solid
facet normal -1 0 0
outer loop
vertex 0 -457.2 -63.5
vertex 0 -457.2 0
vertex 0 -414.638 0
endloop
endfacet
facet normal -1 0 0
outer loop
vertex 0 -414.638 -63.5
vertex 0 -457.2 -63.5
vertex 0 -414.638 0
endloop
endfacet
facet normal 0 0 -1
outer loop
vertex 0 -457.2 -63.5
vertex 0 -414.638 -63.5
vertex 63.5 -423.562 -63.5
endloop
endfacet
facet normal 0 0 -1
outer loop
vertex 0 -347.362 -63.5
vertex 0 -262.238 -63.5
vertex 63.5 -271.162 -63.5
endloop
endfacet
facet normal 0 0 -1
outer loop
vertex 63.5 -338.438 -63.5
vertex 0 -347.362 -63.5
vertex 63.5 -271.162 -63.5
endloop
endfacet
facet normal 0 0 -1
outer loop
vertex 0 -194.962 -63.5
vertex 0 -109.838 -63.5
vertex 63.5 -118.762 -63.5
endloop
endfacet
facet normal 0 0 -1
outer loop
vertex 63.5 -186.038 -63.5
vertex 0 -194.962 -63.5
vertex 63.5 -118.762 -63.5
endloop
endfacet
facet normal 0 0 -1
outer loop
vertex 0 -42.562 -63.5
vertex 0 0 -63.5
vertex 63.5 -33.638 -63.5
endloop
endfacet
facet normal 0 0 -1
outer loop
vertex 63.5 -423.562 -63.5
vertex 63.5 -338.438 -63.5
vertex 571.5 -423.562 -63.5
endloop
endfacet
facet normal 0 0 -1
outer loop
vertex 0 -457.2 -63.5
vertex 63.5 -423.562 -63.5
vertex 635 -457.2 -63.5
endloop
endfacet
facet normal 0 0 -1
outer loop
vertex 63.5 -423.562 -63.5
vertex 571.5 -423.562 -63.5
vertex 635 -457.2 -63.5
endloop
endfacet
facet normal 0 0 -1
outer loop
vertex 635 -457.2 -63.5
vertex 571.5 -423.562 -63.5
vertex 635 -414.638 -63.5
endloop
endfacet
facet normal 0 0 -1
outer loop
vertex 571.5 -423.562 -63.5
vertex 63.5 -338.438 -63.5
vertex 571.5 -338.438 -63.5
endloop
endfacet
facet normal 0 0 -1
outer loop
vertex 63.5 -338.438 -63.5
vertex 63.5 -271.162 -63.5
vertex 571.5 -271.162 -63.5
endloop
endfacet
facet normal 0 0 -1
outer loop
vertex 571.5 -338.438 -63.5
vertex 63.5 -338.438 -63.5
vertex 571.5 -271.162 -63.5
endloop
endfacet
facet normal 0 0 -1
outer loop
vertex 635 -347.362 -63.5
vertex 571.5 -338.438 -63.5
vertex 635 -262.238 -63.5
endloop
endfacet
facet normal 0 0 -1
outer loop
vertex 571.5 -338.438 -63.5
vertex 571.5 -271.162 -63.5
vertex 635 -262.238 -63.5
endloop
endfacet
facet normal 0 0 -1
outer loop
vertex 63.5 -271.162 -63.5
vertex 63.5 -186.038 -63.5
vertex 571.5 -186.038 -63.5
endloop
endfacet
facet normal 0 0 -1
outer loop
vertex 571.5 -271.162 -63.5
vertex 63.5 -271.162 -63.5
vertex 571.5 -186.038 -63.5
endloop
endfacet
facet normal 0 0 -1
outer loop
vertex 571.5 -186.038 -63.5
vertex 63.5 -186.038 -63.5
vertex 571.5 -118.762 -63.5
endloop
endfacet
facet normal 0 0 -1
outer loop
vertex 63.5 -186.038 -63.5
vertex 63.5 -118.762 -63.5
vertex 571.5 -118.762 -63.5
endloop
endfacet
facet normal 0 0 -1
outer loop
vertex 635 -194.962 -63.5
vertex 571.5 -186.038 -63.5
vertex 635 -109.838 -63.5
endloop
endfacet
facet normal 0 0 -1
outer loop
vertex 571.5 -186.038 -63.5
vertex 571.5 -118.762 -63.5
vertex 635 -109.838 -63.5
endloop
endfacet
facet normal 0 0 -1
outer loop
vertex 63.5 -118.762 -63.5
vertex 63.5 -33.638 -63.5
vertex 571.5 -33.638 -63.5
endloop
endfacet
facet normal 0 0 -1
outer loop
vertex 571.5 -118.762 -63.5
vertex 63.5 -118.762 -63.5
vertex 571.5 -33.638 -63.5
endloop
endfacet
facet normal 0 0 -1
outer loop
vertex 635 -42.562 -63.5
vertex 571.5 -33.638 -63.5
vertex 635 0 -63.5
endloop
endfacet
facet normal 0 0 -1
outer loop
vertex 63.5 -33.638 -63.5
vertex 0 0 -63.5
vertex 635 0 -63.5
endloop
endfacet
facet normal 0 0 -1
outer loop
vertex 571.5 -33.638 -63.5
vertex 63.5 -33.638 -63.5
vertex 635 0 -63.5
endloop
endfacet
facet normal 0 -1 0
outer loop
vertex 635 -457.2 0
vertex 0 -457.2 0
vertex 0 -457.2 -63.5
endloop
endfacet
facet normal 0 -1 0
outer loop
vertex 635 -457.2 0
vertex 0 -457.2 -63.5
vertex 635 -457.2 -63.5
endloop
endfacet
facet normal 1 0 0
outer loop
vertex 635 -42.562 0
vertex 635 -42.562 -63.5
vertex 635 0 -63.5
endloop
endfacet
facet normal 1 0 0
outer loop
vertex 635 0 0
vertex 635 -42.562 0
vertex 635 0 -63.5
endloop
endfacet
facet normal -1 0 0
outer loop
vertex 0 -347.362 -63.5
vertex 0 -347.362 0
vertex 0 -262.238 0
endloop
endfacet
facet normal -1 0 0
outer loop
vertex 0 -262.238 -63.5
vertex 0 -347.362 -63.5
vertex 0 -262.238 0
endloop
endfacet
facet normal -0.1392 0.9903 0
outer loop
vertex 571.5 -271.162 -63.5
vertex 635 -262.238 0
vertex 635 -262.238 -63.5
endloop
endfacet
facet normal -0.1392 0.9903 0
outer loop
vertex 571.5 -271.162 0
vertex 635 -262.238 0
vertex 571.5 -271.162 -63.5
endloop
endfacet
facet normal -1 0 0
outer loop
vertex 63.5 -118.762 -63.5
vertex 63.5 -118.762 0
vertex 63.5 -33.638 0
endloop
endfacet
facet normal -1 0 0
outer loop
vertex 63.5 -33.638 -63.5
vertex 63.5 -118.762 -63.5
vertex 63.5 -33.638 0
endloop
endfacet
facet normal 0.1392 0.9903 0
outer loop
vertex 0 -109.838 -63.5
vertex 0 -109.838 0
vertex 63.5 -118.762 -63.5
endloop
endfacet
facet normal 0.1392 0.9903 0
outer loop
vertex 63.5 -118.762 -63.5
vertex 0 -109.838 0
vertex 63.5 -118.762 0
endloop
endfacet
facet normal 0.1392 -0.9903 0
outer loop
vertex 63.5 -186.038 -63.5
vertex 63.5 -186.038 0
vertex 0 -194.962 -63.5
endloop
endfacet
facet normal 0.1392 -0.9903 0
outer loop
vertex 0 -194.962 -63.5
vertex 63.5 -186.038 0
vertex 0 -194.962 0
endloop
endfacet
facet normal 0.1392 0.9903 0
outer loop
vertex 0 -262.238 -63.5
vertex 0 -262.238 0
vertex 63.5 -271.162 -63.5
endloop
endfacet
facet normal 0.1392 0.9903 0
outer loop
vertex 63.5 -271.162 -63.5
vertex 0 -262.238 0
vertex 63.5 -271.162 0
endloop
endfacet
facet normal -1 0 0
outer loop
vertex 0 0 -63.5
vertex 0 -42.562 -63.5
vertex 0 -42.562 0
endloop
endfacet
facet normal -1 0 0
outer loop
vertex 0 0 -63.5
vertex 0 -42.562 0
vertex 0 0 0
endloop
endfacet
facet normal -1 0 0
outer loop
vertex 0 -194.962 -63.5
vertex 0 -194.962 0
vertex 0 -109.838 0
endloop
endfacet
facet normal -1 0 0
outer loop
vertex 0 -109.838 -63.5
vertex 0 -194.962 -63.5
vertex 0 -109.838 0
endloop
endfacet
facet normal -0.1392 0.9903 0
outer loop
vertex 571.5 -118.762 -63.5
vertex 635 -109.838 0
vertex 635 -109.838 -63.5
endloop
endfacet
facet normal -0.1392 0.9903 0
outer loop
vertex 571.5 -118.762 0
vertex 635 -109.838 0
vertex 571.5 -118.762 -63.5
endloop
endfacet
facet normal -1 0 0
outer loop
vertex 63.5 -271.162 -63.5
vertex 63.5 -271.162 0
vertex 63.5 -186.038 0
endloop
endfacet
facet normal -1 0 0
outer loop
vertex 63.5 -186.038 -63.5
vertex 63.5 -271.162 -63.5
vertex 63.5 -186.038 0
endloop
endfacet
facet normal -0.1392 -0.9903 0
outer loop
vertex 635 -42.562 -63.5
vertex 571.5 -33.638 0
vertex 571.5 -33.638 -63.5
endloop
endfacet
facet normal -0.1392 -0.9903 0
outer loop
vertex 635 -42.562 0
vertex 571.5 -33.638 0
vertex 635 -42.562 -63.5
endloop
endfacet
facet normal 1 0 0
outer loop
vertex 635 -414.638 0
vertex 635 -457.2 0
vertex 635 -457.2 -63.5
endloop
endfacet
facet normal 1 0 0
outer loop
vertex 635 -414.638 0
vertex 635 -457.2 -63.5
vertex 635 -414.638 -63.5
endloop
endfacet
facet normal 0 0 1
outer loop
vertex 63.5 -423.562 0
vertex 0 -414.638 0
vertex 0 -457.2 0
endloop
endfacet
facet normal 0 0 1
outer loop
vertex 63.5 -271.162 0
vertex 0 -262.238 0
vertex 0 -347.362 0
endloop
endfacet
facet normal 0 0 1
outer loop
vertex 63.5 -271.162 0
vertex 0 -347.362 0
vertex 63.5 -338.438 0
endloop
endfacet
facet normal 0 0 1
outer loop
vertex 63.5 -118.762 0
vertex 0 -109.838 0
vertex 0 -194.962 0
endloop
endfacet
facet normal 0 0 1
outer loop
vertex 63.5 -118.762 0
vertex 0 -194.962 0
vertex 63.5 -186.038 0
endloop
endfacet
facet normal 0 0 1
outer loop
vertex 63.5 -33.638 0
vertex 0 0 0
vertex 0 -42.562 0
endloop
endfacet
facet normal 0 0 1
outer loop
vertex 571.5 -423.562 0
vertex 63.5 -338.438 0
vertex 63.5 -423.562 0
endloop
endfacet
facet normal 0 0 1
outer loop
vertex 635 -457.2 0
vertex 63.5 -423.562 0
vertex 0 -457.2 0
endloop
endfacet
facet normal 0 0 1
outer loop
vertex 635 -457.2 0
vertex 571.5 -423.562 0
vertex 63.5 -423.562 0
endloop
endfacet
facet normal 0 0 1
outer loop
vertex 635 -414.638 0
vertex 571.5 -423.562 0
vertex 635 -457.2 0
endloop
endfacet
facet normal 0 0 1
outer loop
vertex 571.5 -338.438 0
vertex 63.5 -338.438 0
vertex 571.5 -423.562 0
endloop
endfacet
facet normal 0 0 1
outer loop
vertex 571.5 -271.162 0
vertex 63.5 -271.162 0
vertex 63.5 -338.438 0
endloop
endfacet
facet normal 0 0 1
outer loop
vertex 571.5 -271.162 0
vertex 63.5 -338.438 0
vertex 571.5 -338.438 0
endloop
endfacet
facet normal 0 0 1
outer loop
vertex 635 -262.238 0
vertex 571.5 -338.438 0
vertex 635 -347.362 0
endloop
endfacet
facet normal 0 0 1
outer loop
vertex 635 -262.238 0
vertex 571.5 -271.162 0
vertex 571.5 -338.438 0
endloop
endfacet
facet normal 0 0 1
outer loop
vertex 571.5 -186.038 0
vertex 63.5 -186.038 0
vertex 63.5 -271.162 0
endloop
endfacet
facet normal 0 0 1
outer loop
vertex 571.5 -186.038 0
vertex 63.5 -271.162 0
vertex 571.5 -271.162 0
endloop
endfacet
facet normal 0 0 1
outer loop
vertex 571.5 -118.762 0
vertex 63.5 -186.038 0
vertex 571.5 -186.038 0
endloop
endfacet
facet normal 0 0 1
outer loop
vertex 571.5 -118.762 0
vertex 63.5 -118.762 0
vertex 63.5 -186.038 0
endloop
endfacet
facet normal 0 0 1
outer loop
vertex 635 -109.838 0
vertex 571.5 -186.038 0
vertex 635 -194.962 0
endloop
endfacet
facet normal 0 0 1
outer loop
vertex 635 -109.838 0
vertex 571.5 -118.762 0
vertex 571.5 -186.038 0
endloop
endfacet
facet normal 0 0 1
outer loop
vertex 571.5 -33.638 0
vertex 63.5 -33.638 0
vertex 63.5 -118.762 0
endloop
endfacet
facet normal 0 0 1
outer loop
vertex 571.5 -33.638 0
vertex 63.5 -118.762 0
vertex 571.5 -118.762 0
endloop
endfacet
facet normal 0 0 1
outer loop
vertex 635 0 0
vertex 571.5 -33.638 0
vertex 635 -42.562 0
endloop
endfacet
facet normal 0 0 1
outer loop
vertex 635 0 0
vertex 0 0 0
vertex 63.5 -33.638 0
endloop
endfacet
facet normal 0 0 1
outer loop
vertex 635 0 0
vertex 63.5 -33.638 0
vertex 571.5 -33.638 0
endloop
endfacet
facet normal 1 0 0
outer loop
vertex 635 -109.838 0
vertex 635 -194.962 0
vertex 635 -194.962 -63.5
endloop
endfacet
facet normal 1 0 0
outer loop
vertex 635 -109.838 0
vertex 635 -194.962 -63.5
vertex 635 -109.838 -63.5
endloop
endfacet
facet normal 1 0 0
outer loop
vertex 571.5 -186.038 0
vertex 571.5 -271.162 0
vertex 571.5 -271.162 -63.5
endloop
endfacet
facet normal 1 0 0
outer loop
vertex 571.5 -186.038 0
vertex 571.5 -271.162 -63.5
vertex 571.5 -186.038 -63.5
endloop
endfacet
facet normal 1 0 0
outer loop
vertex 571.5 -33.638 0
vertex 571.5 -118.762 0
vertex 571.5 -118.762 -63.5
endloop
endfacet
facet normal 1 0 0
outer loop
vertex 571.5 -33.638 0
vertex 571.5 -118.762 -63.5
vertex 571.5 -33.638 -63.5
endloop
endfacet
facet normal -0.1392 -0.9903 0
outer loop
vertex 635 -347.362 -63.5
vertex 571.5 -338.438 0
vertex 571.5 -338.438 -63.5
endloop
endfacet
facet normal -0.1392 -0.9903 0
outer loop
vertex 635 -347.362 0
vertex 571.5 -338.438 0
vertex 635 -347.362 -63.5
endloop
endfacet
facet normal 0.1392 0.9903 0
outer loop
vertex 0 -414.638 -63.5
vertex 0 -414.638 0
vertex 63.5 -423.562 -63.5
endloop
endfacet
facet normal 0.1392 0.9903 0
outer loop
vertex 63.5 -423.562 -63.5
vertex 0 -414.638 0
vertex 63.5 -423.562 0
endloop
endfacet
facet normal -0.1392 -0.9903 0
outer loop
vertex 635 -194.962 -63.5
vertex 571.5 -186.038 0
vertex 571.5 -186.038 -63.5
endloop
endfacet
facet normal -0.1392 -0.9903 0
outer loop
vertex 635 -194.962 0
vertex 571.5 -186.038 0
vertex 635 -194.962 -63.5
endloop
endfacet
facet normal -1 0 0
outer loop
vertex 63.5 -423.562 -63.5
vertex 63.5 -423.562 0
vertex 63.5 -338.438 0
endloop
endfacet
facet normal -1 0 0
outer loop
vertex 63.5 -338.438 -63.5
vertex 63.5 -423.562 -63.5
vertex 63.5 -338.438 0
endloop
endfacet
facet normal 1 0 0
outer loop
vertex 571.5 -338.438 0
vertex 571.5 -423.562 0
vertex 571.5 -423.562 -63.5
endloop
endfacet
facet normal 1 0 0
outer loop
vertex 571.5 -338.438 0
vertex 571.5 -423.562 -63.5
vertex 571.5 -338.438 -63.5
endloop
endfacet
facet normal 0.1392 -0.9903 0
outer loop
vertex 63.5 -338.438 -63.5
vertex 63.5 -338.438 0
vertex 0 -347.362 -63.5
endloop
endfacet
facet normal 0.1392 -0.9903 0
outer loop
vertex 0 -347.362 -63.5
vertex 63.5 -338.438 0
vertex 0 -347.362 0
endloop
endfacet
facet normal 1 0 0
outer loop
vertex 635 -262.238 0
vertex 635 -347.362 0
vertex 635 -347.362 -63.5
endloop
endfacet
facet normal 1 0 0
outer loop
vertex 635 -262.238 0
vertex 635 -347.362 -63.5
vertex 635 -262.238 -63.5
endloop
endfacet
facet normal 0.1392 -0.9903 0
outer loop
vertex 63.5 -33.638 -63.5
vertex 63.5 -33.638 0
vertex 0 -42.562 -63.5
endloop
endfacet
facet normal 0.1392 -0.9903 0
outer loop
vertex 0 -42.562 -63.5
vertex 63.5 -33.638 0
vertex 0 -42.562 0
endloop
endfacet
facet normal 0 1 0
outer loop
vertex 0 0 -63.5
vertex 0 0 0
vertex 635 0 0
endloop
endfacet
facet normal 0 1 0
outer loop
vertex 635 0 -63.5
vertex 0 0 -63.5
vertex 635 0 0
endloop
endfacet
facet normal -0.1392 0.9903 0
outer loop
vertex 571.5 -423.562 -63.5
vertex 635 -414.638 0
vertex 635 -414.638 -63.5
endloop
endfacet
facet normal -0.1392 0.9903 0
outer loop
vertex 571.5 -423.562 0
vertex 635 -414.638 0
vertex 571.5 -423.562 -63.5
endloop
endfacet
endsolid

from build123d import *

# Parameters (mm, degrees)
F0_W     = 635
F0_H     = 457.2
F1_DEPTH = 63.5
F3_DEPTH = 63.501


# Not quite as in the source:
# - a pattern or mirror of a feature is missing from the dataset's text; its kind, count and spacing are read off the source's solid


with BuildPart() as f1:
    # F0 (on Top) → F1 (new body)
    with BuildSketch(Plane.XY):
        with Locations((317.5, -228.6)):
            Rectangle(F0_W, F0_H)
    extrude(amount=-F1_DEPTH)

    # F2 (on Top) → F3 (cut, through all)
    with BuildSketch(Plane.XY):
        Polygon((63.5, -33.6378284982), (0, -42.5621715018), (0, -109.8378284982), (63.5, -118.7621715018), align=None)
        Polygon((63.5, -186.0378284982), (0, -194.9621715018), (0, -262.2378284982), (63.5, -271.1621715018), align=None)
        Polygon((63.5, -338.4378284982), (0, -347.3621715018), (0, -414.6378284982), (63.5, -423.5621715018), align=None)
    f3 = extrude(amount=-F3_DEPTH, mode=Mode.SUBTRACT)

    # F3_copies: F3 across plane
    add(f3.mirror(Plane(origin=(317.5, 0, 0), x_dir=(0, 0, 1), z_dir=(1, 0, 0))), mode=Mode.SUBTRACT)


solid = f1.part
